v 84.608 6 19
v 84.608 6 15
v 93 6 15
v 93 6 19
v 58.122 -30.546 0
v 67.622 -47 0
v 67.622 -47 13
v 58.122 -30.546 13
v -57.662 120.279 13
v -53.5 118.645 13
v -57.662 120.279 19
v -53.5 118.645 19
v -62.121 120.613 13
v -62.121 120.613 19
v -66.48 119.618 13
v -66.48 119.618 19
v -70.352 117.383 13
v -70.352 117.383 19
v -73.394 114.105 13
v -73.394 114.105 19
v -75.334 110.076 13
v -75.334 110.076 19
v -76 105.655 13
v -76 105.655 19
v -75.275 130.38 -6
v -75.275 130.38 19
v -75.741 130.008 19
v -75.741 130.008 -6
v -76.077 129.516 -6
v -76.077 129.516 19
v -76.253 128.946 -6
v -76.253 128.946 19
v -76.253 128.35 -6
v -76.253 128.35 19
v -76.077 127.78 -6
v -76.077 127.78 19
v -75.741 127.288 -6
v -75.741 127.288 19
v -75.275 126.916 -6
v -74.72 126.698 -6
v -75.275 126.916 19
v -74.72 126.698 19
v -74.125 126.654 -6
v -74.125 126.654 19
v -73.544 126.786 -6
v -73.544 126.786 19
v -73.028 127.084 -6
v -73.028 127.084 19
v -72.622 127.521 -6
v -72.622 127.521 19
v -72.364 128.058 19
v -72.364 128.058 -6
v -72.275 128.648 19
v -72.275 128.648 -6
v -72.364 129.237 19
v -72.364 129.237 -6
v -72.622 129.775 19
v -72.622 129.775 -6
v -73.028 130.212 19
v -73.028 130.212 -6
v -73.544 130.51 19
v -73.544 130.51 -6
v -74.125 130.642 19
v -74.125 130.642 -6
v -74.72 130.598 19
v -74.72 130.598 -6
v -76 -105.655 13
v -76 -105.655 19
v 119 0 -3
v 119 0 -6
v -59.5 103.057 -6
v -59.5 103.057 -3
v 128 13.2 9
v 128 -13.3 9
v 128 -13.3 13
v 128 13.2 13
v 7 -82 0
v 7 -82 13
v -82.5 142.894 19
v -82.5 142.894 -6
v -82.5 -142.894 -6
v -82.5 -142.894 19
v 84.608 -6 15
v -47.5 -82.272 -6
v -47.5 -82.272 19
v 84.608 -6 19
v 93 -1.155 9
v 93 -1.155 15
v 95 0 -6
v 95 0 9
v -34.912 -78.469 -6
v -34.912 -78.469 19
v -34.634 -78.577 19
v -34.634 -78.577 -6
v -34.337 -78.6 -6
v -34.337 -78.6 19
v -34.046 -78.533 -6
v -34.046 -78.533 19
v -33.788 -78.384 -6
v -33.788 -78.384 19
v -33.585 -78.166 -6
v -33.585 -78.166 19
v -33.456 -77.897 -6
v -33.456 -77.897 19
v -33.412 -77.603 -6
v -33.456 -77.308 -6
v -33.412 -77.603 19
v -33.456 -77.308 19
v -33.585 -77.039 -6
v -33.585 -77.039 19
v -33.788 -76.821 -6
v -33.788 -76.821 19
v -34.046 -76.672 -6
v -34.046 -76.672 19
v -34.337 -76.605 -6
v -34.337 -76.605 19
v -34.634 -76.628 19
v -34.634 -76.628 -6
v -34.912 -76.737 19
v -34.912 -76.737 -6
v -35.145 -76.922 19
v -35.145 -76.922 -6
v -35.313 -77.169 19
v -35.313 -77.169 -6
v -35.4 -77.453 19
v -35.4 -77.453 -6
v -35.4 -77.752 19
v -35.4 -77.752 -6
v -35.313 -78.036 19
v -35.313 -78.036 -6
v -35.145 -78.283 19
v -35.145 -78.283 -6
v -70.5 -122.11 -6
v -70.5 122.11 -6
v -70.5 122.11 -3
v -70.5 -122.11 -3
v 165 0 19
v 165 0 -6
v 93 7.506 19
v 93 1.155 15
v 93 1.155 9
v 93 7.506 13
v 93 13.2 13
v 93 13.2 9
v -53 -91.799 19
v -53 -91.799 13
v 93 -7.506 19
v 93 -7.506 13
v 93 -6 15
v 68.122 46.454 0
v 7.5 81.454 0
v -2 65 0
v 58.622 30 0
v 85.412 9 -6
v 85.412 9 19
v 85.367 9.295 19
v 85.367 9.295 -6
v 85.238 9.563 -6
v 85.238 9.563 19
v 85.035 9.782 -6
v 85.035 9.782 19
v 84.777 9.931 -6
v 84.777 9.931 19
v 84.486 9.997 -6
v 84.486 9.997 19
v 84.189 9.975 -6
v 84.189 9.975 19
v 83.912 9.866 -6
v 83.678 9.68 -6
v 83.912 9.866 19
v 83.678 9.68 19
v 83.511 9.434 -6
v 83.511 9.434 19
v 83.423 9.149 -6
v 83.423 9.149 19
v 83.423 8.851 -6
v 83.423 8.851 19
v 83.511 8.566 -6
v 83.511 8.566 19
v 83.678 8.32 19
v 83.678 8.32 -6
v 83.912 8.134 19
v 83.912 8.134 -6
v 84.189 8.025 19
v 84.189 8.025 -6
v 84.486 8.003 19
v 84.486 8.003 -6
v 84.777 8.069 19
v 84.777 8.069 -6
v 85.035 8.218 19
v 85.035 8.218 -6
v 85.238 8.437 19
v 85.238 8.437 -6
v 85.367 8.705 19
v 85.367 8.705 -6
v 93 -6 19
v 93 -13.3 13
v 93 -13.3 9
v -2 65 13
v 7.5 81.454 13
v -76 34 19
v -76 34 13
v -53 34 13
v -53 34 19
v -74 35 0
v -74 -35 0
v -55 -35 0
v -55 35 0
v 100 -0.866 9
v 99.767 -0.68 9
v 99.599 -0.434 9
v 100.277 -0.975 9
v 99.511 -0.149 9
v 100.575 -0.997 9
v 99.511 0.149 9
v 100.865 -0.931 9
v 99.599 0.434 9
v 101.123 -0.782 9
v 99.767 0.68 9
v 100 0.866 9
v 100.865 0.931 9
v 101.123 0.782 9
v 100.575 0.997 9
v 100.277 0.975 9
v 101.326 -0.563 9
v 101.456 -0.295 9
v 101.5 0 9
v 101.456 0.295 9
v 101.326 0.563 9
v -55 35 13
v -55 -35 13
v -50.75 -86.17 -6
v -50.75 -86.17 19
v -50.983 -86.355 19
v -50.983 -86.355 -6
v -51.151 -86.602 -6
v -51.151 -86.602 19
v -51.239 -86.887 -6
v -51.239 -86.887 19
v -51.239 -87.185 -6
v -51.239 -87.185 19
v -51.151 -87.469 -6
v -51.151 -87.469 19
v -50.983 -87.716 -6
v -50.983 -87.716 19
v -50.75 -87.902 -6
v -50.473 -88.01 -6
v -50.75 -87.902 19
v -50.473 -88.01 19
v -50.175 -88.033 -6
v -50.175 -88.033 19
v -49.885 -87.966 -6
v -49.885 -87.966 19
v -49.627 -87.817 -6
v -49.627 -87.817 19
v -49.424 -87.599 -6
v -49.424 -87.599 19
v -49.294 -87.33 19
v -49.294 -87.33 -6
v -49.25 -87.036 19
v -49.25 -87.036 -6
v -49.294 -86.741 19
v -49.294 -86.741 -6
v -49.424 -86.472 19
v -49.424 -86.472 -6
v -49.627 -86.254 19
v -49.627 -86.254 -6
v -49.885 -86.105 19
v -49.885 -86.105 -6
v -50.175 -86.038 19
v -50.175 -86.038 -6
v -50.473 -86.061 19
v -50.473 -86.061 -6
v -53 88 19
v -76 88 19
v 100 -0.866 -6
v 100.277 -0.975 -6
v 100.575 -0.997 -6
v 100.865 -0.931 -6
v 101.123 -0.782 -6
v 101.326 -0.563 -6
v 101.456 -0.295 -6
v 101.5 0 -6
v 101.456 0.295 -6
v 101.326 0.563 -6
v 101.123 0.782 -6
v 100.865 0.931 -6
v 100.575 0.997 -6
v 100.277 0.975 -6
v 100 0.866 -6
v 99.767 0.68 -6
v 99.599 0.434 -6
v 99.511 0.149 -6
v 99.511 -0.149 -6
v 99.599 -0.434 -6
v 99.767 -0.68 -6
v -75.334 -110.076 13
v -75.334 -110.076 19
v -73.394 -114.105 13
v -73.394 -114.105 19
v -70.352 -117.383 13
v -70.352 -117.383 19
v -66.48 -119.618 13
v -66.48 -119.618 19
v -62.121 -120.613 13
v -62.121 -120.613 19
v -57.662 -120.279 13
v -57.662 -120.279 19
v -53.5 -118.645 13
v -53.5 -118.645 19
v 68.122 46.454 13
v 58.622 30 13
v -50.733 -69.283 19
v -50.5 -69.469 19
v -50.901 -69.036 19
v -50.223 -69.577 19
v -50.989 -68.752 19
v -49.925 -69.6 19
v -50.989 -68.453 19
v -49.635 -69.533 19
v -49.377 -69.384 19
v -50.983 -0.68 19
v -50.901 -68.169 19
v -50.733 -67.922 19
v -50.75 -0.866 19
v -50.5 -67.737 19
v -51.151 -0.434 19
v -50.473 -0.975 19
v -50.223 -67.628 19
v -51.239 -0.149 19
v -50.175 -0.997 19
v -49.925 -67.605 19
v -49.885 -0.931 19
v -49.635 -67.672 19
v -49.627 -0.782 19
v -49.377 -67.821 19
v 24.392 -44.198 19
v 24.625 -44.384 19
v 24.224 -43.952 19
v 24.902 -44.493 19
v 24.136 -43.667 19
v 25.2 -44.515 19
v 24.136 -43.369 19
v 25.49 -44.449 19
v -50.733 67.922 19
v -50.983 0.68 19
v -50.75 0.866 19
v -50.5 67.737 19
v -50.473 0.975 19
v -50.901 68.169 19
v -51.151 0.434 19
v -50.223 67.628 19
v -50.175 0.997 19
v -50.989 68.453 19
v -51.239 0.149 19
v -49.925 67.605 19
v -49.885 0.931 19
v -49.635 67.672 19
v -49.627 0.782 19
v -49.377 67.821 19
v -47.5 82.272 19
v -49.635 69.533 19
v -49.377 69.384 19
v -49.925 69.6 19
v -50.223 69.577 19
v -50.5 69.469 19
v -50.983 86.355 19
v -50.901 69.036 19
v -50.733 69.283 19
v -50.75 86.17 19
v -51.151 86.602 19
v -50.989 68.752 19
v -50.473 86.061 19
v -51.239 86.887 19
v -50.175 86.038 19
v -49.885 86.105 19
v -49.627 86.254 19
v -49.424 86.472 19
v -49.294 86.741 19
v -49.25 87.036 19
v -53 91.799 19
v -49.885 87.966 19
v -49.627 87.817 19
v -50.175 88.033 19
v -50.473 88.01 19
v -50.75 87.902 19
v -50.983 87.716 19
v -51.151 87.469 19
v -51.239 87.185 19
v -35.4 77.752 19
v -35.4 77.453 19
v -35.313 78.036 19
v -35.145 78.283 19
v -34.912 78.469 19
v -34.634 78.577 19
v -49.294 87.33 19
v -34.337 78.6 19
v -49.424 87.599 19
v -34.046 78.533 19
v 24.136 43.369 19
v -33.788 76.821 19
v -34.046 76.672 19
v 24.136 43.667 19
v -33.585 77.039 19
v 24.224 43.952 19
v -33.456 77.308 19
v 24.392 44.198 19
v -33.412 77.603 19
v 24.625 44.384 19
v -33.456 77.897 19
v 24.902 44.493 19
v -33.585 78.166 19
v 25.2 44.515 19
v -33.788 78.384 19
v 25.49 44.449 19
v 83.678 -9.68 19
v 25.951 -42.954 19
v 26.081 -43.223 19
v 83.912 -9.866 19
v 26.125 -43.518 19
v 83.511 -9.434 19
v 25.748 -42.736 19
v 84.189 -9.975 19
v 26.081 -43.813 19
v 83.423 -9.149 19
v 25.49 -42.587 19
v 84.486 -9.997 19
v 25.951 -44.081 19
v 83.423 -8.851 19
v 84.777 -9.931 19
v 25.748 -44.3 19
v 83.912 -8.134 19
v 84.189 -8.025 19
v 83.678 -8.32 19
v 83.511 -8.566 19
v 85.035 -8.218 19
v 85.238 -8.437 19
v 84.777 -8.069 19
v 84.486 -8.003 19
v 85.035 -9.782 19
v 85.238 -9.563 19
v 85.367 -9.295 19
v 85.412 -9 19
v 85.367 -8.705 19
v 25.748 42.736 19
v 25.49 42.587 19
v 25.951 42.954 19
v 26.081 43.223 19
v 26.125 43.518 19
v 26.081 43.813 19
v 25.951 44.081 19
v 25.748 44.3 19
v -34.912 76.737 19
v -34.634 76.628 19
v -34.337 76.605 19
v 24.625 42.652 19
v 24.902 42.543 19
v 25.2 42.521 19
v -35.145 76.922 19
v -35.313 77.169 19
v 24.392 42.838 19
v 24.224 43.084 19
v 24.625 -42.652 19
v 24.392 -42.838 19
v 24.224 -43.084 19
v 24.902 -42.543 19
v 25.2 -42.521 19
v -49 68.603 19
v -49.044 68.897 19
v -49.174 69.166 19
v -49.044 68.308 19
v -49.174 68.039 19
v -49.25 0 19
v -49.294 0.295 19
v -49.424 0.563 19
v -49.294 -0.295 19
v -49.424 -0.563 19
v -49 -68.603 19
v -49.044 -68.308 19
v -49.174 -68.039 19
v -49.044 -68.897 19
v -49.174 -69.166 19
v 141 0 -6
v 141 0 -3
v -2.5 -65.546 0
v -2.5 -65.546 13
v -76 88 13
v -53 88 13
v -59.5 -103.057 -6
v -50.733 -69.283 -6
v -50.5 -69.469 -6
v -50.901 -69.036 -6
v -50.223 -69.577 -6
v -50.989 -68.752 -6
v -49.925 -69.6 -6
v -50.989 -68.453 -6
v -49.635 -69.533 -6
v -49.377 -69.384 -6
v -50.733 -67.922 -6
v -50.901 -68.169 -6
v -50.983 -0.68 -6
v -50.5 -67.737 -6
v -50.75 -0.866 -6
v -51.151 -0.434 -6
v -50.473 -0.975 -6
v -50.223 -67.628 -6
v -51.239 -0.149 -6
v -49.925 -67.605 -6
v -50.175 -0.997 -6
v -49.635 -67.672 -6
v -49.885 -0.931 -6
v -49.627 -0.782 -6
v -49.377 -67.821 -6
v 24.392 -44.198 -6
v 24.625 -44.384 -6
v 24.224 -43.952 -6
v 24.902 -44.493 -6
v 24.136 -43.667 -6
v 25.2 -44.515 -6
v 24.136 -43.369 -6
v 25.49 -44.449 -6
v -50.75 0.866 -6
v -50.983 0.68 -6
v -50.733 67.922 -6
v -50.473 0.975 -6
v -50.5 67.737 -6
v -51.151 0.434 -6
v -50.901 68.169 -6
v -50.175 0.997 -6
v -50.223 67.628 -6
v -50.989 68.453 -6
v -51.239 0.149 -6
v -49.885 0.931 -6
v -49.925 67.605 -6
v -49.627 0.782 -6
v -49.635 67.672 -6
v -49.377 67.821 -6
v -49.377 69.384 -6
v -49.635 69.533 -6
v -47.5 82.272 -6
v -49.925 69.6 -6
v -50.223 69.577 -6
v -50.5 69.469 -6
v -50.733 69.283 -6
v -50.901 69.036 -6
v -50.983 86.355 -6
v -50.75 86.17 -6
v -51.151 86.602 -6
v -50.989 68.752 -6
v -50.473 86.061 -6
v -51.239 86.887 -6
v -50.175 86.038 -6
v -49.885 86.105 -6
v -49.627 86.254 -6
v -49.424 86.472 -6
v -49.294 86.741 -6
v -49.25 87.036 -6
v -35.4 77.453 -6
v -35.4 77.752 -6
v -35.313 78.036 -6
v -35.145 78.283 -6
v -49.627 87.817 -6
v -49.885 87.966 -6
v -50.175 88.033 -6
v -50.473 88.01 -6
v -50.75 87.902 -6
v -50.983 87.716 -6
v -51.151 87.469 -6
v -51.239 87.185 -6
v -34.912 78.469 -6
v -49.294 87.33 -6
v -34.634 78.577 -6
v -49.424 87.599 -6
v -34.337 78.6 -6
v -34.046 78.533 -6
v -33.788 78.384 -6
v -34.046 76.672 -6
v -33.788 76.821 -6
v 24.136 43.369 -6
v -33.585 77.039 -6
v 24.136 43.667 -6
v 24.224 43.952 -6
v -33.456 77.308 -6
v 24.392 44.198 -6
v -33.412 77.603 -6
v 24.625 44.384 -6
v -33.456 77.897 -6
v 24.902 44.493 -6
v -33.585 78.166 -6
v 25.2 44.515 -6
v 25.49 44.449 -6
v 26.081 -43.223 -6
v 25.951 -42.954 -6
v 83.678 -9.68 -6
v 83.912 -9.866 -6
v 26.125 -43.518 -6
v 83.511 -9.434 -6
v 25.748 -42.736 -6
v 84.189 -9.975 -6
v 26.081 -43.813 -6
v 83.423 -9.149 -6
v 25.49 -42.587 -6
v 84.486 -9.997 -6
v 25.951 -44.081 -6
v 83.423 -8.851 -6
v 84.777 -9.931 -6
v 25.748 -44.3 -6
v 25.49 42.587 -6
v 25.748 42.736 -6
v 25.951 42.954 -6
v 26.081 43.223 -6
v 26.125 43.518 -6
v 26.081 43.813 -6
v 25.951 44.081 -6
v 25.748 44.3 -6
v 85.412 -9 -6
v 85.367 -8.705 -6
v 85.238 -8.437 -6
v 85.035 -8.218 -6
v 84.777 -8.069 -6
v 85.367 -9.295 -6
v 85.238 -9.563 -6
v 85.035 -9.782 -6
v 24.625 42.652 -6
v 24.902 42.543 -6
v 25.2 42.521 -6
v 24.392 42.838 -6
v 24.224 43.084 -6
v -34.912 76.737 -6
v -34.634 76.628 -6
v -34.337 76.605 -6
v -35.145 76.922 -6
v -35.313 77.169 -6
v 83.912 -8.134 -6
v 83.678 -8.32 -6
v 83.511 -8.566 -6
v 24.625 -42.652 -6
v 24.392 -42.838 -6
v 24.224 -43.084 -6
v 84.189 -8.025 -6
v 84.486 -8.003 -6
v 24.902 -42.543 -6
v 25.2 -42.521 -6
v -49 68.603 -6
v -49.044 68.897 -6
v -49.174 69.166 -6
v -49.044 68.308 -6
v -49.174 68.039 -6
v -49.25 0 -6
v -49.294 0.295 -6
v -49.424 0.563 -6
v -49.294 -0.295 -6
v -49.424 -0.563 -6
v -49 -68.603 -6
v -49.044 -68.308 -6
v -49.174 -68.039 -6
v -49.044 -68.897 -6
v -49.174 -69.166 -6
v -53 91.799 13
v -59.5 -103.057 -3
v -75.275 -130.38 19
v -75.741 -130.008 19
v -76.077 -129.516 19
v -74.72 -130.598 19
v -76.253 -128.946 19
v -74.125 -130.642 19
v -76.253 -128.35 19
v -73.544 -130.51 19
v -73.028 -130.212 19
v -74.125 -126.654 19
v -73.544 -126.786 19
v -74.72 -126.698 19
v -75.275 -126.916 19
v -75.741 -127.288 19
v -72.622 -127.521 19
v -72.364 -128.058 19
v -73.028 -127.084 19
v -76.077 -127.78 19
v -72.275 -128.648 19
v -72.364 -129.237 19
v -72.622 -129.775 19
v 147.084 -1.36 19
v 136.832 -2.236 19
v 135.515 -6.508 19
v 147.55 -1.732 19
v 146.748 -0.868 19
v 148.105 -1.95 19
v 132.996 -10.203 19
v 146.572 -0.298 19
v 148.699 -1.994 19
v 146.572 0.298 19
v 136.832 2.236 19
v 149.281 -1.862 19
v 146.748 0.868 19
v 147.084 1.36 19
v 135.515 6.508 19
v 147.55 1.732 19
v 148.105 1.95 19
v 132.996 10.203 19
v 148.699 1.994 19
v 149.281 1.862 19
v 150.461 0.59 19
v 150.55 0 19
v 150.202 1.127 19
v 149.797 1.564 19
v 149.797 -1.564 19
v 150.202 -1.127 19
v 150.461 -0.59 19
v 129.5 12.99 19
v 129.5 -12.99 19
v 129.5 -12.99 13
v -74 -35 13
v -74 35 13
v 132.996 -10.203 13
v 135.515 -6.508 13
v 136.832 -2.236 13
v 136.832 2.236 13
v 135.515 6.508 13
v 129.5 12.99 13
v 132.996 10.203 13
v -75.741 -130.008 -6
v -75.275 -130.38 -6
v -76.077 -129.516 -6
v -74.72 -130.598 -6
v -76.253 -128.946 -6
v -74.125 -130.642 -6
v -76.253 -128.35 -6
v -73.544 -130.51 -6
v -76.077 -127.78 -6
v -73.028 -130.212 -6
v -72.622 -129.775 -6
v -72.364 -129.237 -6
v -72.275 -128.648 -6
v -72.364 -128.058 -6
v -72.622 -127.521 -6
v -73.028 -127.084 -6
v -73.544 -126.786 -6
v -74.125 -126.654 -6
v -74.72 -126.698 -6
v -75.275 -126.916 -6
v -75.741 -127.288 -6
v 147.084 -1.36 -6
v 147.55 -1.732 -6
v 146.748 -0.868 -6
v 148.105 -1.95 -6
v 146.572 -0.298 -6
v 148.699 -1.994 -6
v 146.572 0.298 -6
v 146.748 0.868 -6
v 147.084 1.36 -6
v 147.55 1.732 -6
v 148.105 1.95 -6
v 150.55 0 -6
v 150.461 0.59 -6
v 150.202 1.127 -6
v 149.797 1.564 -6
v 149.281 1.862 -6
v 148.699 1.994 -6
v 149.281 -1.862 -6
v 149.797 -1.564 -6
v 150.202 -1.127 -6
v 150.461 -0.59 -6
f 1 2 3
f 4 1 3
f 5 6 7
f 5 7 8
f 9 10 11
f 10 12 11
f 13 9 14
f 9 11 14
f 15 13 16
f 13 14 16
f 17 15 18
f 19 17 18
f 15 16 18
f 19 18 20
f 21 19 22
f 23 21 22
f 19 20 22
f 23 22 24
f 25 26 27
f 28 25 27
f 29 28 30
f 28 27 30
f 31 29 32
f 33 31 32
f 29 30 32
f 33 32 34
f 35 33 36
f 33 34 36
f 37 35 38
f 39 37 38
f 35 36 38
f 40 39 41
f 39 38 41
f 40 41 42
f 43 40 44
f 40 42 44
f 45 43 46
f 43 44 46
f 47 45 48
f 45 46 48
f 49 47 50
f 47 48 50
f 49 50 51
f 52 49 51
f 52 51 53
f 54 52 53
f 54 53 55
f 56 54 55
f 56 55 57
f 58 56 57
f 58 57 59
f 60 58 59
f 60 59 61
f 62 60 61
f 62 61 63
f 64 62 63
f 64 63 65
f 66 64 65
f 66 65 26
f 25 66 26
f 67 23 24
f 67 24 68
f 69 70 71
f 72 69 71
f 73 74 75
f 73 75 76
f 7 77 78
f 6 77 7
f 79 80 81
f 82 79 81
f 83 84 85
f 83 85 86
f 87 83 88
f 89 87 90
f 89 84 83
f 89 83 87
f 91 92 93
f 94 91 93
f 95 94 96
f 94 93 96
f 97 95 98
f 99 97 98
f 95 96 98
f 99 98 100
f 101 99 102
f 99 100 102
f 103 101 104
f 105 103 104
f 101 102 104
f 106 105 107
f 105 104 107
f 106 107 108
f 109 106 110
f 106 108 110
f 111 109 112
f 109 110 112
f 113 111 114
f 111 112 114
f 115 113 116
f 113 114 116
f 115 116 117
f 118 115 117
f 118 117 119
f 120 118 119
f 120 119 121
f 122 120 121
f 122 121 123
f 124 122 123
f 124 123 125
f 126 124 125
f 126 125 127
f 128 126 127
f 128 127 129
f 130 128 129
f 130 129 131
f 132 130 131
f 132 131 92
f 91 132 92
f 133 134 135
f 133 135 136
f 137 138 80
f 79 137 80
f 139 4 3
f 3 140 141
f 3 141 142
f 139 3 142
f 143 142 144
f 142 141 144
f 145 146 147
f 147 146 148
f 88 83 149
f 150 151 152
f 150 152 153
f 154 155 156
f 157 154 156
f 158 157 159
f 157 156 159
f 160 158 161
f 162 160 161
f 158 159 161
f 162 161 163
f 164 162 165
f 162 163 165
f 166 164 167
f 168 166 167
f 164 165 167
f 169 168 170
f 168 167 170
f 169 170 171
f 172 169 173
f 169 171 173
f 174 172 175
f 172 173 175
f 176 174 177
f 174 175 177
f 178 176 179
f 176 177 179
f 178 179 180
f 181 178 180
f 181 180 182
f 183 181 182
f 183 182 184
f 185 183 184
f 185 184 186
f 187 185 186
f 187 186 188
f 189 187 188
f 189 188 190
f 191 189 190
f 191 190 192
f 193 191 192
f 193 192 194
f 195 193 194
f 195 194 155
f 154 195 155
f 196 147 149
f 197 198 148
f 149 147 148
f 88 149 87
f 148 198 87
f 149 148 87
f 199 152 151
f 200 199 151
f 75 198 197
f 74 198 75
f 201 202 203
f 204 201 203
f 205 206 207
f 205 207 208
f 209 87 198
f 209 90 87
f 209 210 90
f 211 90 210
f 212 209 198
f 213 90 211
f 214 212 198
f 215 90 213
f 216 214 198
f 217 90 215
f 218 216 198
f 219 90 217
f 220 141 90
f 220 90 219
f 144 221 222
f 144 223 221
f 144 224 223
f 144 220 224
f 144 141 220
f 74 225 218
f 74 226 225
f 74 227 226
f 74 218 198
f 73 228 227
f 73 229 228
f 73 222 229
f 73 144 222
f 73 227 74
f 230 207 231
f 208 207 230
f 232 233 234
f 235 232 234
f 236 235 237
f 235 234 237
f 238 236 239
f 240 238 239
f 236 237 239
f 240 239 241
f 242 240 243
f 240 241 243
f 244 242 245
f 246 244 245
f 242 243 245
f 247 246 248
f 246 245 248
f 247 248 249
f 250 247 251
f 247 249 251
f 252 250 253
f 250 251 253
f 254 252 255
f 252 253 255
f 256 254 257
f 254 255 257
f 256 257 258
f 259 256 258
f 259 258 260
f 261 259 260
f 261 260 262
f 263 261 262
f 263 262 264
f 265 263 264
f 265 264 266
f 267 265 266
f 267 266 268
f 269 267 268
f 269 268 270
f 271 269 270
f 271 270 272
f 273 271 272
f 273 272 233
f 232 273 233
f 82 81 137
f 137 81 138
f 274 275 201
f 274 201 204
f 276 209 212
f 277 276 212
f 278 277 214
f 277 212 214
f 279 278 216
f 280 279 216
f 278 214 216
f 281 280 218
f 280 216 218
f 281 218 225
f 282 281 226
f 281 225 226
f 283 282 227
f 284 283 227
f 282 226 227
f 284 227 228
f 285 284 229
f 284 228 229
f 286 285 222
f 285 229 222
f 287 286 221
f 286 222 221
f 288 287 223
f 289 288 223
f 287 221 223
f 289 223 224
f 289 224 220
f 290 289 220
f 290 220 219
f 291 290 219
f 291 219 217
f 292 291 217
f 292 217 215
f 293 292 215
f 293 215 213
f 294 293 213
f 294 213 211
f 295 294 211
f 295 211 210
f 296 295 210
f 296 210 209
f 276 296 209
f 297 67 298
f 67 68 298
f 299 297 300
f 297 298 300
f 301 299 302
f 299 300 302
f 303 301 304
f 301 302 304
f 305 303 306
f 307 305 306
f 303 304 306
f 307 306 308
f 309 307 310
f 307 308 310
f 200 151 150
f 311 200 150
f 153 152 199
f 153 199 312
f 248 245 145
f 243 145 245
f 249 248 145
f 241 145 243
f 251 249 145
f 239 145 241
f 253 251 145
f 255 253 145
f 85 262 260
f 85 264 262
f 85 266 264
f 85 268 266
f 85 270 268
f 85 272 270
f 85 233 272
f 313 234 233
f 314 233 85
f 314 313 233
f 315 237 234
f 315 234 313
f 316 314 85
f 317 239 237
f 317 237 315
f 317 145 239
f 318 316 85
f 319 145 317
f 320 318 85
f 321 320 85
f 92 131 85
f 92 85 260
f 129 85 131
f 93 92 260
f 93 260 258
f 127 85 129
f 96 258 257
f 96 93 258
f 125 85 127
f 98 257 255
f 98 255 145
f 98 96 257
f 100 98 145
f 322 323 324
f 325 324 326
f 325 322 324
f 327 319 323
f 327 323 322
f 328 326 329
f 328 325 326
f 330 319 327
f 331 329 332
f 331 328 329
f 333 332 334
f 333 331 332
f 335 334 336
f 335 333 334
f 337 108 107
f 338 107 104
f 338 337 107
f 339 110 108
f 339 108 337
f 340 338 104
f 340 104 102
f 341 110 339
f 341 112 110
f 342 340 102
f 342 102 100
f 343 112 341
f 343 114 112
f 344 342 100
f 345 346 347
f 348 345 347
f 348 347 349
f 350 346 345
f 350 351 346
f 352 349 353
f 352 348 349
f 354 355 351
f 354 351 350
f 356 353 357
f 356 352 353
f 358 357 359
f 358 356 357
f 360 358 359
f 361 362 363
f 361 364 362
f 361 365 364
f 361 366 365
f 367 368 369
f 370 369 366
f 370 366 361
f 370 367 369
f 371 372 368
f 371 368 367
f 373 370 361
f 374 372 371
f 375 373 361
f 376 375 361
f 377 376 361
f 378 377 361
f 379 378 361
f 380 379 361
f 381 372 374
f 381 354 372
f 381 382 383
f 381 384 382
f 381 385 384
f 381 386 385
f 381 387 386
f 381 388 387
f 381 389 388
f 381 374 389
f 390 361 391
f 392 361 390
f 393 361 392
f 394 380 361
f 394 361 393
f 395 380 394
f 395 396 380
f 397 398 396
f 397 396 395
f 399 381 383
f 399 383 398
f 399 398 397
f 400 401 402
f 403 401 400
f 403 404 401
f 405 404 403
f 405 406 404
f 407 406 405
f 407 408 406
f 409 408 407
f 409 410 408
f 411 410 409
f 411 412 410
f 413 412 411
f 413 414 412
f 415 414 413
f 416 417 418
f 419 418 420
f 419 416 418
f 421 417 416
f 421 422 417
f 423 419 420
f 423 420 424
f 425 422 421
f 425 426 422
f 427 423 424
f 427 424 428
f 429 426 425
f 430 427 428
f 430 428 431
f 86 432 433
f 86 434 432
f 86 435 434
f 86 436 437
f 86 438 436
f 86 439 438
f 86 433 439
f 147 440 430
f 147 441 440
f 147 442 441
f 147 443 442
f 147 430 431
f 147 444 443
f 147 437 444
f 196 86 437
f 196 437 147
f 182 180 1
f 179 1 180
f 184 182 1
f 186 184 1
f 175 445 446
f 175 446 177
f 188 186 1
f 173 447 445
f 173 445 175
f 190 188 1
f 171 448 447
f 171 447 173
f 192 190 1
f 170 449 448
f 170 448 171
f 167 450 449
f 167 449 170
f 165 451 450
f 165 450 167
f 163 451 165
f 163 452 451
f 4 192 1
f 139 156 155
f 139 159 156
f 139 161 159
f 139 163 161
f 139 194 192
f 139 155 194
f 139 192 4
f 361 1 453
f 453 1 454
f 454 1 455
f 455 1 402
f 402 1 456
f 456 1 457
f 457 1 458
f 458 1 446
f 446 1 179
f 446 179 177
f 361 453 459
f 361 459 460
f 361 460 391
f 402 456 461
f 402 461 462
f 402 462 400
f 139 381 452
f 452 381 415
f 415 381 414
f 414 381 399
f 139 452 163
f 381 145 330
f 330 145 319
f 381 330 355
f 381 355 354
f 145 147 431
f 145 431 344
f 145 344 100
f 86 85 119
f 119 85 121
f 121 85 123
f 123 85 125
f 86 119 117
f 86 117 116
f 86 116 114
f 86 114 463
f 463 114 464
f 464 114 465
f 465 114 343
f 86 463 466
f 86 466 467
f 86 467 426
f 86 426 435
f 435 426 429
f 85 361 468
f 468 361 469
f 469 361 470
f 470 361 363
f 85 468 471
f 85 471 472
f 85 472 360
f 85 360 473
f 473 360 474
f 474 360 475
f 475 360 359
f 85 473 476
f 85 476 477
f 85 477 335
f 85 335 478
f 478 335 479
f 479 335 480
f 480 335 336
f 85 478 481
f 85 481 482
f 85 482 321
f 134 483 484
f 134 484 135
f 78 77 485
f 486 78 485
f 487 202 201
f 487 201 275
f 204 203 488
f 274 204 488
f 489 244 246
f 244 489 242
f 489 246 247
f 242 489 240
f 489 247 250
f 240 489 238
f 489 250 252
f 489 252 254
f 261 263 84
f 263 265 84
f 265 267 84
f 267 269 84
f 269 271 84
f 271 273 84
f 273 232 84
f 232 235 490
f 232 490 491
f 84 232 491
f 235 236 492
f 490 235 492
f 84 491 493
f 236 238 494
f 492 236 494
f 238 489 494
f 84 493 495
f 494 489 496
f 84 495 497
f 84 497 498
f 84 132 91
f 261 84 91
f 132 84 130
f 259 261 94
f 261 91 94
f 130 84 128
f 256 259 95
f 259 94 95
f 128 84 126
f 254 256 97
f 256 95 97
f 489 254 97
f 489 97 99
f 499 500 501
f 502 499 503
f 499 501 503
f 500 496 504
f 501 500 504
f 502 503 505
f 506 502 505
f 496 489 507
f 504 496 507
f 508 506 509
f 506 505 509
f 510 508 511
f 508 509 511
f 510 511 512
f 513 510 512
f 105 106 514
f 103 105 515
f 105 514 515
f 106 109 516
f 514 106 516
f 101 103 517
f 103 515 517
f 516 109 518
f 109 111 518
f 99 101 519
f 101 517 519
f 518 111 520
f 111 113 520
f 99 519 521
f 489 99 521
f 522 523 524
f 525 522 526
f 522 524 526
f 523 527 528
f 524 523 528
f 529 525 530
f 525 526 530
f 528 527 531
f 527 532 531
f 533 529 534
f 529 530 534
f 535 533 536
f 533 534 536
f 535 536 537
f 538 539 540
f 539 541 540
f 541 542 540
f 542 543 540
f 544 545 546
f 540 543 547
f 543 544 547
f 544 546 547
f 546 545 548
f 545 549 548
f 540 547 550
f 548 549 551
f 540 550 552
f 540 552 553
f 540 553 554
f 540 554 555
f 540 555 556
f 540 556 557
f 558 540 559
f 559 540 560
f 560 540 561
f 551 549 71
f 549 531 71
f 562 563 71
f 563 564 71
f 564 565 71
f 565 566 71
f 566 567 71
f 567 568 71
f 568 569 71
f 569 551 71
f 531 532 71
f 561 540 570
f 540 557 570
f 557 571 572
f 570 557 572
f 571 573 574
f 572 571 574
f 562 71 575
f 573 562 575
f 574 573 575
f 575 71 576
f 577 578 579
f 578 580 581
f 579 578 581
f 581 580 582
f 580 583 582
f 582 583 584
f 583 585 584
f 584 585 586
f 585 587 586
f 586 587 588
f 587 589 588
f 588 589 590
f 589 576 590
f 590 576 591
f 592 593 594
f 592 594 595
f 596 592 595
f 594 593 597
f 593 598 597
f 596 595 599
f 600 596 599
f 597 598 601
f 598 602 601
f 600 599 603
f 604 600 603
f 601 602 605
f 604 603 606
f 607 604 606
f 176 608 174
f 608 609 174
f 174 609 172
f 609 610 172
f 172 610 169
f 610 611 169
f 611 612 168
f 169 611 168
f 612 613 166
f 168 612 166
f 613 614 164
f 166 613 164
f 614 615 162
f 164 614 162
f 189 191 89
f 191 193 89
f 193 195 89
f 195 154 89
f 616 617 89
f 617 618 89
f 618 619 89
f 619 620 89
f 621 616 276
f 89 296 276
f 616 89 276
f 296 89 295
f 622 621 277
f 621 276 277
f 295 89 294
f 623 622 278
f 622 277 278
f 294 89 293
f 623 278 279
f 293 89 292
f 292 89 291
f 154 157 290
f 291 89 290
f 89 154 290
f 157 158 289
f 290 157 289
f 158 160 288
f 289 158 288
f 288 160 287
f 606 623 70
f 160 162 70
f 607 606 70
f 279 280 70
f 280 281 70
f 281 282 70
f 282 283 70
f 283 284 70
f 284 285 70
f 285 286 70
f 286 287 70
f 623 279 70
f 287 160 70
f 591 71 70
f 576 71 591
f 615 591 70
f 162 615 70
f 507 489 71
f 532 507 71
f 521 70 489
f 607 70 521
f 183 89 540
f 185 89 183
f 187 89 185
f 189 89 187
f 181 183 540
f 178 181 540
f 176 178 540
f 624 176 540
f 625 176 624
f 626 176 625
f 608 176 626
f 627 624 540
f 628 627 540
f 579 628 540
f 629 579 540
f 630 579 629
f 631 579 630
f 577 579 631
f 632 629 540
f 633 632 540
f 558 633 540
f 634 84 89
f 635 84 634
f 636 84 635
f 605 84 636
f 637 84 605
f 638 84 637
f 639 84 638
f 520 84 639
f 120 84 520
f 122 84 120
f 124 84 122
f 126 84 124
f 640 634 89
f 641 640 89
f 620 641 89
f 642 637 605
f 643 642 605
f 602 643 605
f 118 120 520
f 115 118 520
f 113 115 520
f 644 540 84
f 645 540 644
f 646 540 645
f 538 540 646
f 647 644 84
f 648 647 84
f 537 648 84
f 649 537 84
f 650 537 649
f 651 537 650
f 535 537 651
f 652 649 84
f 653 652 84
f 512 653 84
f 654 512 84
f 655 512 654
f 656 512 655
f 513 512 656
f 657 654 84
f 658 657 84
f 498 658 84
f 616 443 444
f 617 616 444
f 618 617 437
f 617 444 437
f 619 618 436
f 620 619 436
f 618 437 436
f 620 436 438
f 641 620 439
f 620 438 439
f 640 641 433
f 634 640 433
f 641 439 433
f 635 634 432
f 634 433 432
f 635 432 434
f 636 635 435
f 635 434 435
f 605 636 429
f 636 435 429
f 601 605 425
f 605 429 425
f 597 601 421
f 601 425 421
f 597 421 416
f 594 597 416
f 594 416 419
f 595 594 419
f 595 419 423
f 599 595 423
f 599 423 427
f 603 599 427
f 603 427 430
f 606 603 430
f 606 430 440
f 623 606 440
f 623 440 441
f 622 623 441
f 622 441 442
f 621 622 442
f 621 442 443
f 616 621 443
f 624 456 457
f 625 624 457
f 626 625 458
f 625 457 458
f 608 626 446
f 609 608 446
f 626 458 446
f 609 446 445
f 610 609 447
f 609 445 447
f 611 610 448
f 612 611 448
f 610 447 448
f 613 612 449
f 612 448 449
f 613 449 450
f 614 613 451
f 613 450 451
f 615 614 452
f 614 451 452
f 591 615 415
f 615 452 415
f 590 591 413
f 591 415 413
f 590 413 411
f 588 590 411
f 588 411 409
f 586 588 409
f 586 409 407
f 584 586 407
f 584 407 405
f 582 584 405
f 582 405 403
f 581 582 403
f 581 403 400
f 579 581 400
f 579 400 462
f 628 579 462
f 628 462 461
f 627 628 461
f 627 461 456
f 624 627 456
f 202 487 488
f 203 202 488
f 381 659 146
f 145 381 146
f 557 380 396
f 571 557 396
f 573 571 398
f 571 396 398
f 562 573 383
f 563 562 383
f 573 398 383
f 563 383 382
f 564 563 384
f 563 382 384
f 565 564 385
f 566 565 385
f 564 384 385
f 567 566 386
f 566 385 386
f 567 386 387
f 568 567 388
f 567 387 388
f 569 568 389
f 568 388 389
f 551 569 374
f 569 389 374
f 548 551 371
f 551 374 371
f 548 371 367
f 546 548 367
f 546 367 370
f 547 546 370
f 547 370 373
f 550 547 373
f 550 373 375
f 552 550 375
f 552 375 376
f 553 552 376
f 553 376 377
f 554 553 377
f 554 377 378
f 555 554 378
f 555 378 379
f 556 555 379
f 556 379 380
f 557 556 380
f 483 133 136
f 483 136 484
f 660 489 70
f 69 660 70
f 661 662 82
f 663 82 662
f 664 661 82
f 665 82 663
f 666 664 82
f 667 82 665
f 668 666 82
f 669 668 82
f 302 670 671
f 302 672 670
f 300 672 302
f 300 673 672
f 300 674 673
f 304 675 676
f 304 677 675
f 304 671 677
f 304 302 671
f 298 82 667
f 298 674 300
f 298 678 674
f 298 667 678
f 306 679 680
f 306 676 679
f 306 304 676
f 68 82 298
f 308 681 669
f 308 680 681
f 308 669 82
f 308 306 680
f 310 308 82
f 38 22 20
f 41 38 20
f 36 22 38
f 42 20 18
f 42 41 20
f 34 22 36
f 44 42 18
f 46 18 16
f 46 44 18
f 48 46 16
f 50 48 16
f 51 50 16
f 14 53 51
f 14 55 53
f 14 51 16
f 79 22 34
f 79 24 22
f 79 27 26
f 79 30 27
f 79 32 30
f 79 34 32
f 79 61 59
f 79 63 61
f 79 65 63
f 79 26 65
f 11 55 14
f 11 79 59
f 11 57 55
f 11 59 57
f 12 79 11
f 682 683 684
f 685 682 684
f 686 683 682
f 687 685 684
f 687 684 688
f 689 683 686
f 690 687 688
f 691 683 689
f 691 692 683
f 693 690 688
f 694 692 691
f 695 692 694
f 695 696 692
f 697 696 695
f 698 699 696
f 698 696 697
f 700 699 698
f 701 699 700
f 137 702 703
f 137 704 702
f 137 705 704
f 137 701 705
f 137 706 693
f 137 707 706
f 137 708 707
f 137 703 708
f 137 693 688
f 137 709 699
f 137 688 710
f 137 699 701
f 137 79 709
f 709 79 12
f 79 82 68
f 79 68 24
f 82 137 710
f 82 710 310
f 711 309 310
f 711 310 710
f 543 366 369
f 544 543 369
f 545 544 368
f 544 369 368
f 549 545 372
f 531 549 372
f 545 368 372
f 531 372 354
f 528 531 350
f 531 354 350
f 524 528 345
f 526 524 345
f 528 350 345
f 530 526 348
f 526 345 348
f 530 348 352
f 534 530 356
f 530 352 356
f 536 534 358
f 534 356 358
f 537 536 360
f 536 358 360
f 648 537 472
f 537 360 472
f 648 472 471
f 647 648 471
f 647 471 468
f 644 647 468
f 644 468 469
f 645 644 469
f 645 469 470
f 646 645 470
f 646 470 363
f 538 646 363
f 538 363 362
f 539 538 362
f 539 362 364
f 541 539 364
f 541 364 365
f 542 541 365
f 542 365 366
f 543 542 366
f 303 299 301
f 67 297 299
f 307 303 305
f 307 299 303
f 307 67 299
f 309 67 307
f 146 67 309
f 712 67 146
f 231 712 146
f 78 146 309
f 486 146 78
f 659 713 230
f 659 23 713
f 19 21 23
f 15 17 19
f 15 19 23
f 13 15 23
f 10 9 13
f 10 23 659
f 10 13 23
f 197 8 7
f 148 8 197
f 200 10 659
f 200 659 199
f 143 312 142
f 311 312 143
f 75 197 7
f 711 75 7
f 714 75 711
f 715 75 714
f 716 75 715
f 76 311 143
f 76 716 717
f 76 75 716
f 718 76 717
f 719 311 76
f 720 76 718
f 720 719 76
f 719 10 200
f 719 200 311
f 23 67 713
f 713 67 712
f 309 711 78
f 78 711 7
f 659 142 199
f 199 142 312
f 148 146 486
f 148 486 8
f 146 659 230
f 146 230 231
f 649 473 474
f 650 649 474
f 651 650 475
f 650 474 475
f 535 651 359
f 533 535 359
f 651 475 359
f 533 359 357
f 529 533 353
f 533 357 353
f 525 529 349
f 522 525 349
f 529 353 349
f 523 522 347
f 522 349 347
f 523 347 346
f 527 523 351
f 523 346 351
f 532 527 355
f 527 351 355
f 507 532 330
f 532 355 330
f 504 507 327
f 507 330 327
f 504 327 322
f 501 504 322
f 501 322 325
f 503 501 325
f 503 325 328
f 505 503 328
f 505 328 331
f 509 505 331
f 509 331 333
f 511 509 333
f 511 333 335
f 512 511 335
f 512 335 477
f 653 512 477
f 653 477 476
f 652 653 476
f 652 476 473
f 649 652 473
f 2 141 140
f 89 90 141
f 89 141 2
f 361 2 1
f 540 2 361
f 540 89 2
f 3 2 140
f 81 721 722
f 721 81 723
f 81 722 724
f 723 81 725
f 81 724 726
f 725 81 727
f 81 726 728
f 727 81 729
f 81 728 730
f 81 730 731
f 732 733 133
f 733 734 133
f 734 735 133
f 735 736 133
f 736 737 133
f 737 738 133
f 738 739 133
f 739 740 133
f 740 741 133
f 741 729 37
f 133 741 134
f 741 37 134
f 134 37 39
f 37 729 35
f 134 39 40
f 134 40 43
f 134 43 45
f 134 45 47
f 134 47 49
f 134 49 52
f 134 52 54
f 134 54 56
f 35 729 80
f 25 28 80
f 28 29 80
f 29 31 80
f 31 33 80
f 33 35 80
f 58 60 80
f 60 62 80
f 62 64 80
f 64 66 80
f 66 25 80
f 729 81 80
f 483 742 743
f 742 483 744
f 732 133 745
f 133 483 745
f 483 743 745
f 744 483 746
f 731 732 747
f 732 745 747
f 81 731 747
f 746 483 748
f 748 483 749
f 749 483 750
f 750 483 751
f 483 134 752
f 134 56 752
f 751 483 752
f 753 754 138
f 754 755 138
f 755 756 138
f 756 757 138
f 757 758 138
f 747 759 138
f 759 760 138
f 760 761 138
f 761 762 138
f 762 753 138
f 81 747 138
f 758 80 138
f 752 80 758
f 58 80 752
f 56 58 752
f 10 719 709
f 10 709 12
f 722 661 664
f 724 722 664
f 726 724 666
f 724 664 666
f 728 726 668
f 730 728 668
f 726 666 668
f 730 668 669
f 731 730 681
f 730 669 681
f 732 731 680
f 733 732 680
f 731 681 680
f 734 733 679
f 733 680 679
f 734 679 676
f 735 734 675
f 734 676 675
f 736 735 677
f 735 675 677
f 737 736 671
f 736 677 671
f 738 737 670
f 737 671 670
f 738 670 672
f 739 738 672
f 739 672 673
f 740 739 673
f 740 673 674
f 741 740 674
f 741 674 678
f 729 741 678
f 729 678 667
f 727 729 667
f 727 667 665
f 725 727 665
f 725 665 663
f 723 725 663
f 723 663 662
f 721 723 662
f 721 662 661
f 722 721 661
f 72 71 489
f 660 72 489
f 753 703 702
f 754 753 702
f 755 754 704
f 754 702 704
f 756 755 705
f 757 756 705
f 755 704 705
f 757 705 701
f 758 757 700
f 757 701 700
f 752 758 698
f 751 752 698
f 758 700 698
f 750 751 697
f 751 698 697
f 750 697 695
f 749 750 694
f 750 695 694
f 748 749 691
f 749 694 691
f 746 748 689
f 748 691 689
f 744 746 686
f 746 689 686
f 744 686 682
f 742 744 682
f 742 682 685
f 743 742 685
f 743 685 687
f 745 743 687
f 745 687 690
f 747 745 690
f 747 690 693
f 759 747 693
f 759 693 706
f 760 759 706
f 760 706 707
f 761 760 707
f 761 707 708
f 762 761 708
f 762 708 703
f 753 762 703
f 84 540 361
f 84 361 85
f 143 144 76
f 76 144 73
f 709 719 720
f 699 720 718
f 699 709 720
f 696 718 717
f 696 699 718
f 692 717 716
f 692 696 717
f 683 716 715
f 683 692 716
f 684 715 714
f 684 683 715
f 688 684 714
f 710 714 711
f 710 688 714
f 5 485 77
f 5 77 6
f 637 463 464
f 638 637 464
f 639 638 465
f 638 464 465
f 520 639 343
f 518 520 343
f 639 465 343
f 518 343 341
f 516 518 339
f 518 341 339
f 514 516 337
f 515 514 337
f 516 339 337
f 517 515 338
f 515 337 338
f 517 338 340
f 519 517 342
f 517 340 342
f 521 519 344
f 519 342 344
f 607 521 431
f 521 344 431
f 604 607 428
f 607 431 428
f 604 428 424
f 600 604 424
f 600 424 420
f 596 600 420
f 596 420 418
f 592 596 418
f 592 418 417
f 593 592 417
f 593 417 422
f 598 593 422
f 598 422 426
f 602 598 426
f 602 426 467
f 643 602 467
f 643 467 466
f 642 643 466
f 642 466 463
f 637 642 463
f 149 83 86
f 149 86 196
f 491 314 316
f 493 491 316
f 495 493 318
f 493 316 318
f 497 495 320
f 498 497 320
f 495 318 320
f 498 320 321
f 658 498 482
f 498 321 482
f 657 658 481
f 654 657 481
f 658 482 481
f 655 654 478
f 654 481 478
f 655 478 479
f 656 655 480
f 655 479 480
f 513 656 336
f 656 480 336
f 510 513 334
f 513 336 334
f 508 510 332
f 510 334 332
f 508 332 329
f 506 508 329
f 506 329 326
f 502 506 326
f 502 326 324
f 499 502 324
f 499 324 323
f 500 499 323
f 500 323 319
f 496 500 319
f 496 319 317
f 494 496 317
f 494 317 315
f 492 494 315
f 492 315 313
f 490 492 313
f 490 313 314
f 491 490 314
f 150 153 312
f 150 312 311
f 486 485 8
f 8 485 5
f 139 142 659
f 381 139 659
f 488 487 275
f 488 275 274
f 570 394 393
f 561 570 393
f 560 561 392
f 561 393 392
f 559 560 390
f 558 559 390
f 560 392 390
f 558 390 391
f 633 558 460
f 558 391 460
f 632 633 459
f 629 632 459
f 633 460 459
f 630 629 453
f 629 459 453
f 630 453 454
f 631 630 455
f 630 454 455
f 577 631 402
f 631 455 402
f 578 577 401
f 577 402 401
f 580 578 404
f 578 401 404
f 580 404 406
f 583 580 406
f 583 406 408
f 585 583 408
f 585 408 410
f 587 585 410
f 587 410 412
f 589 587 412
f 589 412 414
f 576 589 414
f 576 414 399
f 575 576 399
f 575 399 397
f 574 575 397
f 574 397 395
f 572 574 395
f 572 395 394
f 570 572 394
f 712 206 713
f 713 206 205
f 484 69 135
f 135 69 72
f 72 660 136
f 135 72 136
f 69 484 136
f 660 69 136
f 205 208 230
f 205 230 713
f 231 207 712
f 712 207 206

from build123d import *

# Parameters (mm, degrees)
BOX005_W               = 23
BOX005_H               = 54
BOX005_DEPTH           = 6
PRISM003_DEPTH         = 6
PRISM002_DEPTH         = 6
BOX004_W               = 10
BOX004_H               = 12
BOX004_DEPTH           = 4
BOX003_W               = 35
BOX003_H               = 26.5
BOX003_DEPTH           = 10
BOX002_W               = 70
BOX002_H               = 19
BOX002_DEPTH           = 19
BOX002_PLACEMENT_ANGLE = 30
BOX001_W               = 70
BOX001_H               = 19
BOX001_DEPTH           = 19
BOX001_PLACEMENT_ANGLE = 90
BOX_W                  = 70
BOX_H                  = 19
BOX_DEPTH              = 19
BOX_PLACEMENT_ANGLE    = 30
PRISM001_DEPTH         = 25
PRISM_DEPTH            = 25
FILLET_R               = 15
SKETCH001_R            = 2
POCKET_DEPTH           = 782.777352
POLARPATTERN_COUNT     = 3
POCKET001_DEPTH        = 3
SKETCH002_R            = 1
POCKET002_DEPTH        = 782.777352
POLARPATTERN001_COUNT  = 3
SKETCH004_R            = 1
POCKET003_DEPTH        = 782.777352
POLARPATTERN002_COUNT  = 3
POLARPATTERN003_COUNT  = 3


with BuildPart() as box005:
    # Box005 → Box005 (new body)
    with BuildSketch(Plane(origin=(-76, 34, 13), x_dir=(1, 0, 0), z_dir=(0, 0, 1))):
        with Locations((11.5, 27)):
            Rectangle(BOX005_W, BOX005_H)
    extrude(amount=BOX005_DEPTH)


with BuildPart() as prism003:
    # Prism003 → Prism003 (new body)
    with BuildSketch(Plane.XY.offset(13)):
        Polygon((106, 0), (-53, 91.798693), (-53, -91.798693), align=None)
    extrude(amount=PRISM003_DEPTH)


with BuildPart() as cut006:
    # Prism002 → Prism002 (new body)
    with BuildSketch(Plane.XY.offset(13)):
        Polygon((152, 0), (-76, 131.635861), (-76, -131.635861), align=None)
    extrude(amount=PRISM002_DEPTH)

    # Cut006: cut Prism003
    add(prism003.part, mode=Mode.SUBTRACT)


with BuildPart() as box004:
    # Box004 → Box004 (new body)
    with BuildSketch(Plane(origin=(84, -6, 15), x_dir=(1, 0, 0), z_dir=(0, 0, 1))):
        with Locations((5, 6)):
            Rectangle(BOX004_W, BOX004_H)
    extrude(amount=BOX004_DEPTH)


with BuildPart() as box003:
    # Box003 → Box003 (new body)
    with BuildSketch(Plane(origin=(93, -13.3, 9), x_dir=(1, 0, 0), z_dir=(0, 0, 1))):
        with Locations((17.5, 13.25)):
            Rectangle(BOX003_W, BOX003_H)
    extrude(amount=BOX003_DEPTH)


with BuildPart() as box002:
    # Box002 → Box002 (new body)
    with BuildSketch(Plane.XY):
        with Locations((35, 9.5)):
            Rectangle(BOX002_W, BOX002_H)
    extrude(amount=BOX002_DEPTH)


with BuildPart() as box002_1:
    # Box002 placement: moved
    add(box002.part.moved(Location((7, -82, 0))).rotate(Axis((7, -82, 0), (0, 0, 1)), BOX002_PLACEMENT_ANGLE))


with BuildPart() as box001:
    # Box001 → Box001 (new body)
    with BuildSketch(Plane.XY):
        with Locations((35, 9.5)):
            Rectangle(BOX001_W, BOX001_H)
    extrude(amount=BOX001_DEPTH)


with BuildPart() as box001_1:
    # Box001 placement: moved
    add(box001.part.moved(Location((-55, -35, 0))).rotate(Axis((-55, -35, 0), (0, 0, 1)), BOX001_PLACEMENT_ANGLE))


with BuildPart() as box:
    # Box → Box (new body)
    with BuildSketch(Plane.XY):
        with Locations((35, 9.5)):
            Rectangle(BOX_W, BOX_H)
    extrude(amount=BOX_DEPTH)


with BuildPart() as box_1:
    # Box placement: moved
    add(box.part.moved(Location((-2, 65, 0))).rotate(Axis((-2, 65, 0), (0, 0, -1)), BOX_PLACEMENT_ANGLE))


with BuildPart() as prism001:
    # Prism001 → Prism001 (new body)
    with BuildSketch(Plane.XY.offset(-6)):
        Polygon((95, 0), (-47.5, 82.272413), (-47.5, -82.272413), align=None)
    extrude(amount=PRISM001_DEPTH)


with BuildPart() as body:
    # Prism → Prism (new body)
    with BuildSketch(Plane.XY.offset(-6)):
        Polygon((165, 0), (-82.5, 142.894192), (-82.5, -142.894192), align=None)
    extrude(amount=PRISM_DEPTH)

    # Cut: cut Prism001
    add(prism001.part, mode=Mode.SUBTRACT)

    # Cut001: cut Box
    add(box_1.part, mode=Mode.SUBTRACT)

    # Cut002: cut Box001
    add(box001_1.part, mode=Mode.SUBTRACT)

    # Cut003: cut Box002
    add(box002_1.part, mode=Mode.SUBTRACT)

    # Cut004: cut Box003
    add(box003.part, mode=Mode.SUBTRACT)

    # Cut005: cut Box004
    add(box004.part, mode=Mode.SUBTRACT)

    # Cut007: cut Cut006
    add(cut006.part, mode=Mode.SUBTRACT)

    # Fillet
    fillet_edges = [body.edges().sort_by_distance(p)[0] for p in [
        (152, 0, 16),
        (-76, 131.635861, 16),
        (-76, -131.635861, 16),
    ]]
    fillet(fillet_edges, radius=FILLET_R)

    # Sketch001 (on Face1 of BaseFeature) → Pocket (cut, through all)
    with BuildSketch(Plane.XY.offset(19)):
        with Locations((148.549835, 0)):
            Circle(SKETCH001_R)
    pocket = extrude(amount=-POCKET_DEPTH, mode=Mode.SUBTRACT)

    # PolarPattern: Pocket ×3 about axis
    polarpattern_axis = Axis((0, 0, 19), (0, 0, 1))
    for i in range(1, POLARPATTERN_COUNT):
        add(pocket.rotate(polarpattern_axis, i * 360 / POLARPATTERN_COUNT), mode=Mode.SUBTRACT)

    # Sketch003 (on Face14 of PolarPattern) → Pocket001 (cut)
    with BuildSketch(Plane(origin=(0, 0, -6), x_dir=(1, 0, 0), z_dir=(0, 0, -1))):
        Polygon((-70.5, 122.109582), (141, 0), (-70.5, -122.109582), align=None)
        Polygon((-59.5, -103.057023), (-59.5, 103.057023), (119, 0), align=None, mode=Mode.SUBTRACT)
    extrude(amount=-POCKET001_DEPTH, mode=Mode.SUBTRACT)

    # Sketch002 (on Face39 of PolarPattern) → Pocket002 (cut, through all)
    with BuildSketch(Plane.XY.offset(19)):
        with Locations((-50.25, 0)):
            Circle(SKETCH002_R)
        with Locations((-50.25, 87.035553)):
            Circle(SKETCH002_R)
    pocket002 = extrude(amount=-POCKET002_DEPTH, mode=Mode.SUBTRACT)

    # PolarPattern001: Pocket002 ×3 about axis
    polarpattern001_axis = Axis((0, 0, 19), (0, 0, 1))
    for i in range(1, POLARPATTERN001_COUNT):
        add(pocket002.rotate(polarpattern001_axis, i * 360 / POLARPATTERN001_COUNT), mode=Mode.SUBTRACT)

    # Sketch004 (on Face40 of PolarPattern001) → Pocket003 (cut, through all)
    with BuildSketch(Plane.XY.offset(19)):
        with Locations((84.411543, 9)):
            Circle(SKETCH004_R)
        with Locations((84.411543, -9)):
            Circle(SKETCH004_R)
    pocket003 = extrude(amount=-POCKET003_DEPTH, mode=Mode.SUBTRACT)

    # PolarPattern002: Pocket003 ×3 about axis
    polarpattern002_axis = Axis((0, 0, 19), (0, 0, 1))
    for i in range(1, POLARPATTERN002_COUNT):
        add(pocket003.rotate(polarpattern002_axis, i * 360 / POLARPATTERN002_COUNT), mode=Mode.SUBTRACT)

    # PolarPattern003: Pocket002 ×3 about axis
    polarpattern003_axis = Axis((0, 0, 19), (0, 0, 1))
    for i in range(1, POLARPATTERN003_COUNT):
        add(pocket002.rotate(polarpattern003_axis, i * 360 / POLARPATTERN003_COUNT), mode=Mode.SUBTRACT)


solid = Compound([box005.part, body.part])
